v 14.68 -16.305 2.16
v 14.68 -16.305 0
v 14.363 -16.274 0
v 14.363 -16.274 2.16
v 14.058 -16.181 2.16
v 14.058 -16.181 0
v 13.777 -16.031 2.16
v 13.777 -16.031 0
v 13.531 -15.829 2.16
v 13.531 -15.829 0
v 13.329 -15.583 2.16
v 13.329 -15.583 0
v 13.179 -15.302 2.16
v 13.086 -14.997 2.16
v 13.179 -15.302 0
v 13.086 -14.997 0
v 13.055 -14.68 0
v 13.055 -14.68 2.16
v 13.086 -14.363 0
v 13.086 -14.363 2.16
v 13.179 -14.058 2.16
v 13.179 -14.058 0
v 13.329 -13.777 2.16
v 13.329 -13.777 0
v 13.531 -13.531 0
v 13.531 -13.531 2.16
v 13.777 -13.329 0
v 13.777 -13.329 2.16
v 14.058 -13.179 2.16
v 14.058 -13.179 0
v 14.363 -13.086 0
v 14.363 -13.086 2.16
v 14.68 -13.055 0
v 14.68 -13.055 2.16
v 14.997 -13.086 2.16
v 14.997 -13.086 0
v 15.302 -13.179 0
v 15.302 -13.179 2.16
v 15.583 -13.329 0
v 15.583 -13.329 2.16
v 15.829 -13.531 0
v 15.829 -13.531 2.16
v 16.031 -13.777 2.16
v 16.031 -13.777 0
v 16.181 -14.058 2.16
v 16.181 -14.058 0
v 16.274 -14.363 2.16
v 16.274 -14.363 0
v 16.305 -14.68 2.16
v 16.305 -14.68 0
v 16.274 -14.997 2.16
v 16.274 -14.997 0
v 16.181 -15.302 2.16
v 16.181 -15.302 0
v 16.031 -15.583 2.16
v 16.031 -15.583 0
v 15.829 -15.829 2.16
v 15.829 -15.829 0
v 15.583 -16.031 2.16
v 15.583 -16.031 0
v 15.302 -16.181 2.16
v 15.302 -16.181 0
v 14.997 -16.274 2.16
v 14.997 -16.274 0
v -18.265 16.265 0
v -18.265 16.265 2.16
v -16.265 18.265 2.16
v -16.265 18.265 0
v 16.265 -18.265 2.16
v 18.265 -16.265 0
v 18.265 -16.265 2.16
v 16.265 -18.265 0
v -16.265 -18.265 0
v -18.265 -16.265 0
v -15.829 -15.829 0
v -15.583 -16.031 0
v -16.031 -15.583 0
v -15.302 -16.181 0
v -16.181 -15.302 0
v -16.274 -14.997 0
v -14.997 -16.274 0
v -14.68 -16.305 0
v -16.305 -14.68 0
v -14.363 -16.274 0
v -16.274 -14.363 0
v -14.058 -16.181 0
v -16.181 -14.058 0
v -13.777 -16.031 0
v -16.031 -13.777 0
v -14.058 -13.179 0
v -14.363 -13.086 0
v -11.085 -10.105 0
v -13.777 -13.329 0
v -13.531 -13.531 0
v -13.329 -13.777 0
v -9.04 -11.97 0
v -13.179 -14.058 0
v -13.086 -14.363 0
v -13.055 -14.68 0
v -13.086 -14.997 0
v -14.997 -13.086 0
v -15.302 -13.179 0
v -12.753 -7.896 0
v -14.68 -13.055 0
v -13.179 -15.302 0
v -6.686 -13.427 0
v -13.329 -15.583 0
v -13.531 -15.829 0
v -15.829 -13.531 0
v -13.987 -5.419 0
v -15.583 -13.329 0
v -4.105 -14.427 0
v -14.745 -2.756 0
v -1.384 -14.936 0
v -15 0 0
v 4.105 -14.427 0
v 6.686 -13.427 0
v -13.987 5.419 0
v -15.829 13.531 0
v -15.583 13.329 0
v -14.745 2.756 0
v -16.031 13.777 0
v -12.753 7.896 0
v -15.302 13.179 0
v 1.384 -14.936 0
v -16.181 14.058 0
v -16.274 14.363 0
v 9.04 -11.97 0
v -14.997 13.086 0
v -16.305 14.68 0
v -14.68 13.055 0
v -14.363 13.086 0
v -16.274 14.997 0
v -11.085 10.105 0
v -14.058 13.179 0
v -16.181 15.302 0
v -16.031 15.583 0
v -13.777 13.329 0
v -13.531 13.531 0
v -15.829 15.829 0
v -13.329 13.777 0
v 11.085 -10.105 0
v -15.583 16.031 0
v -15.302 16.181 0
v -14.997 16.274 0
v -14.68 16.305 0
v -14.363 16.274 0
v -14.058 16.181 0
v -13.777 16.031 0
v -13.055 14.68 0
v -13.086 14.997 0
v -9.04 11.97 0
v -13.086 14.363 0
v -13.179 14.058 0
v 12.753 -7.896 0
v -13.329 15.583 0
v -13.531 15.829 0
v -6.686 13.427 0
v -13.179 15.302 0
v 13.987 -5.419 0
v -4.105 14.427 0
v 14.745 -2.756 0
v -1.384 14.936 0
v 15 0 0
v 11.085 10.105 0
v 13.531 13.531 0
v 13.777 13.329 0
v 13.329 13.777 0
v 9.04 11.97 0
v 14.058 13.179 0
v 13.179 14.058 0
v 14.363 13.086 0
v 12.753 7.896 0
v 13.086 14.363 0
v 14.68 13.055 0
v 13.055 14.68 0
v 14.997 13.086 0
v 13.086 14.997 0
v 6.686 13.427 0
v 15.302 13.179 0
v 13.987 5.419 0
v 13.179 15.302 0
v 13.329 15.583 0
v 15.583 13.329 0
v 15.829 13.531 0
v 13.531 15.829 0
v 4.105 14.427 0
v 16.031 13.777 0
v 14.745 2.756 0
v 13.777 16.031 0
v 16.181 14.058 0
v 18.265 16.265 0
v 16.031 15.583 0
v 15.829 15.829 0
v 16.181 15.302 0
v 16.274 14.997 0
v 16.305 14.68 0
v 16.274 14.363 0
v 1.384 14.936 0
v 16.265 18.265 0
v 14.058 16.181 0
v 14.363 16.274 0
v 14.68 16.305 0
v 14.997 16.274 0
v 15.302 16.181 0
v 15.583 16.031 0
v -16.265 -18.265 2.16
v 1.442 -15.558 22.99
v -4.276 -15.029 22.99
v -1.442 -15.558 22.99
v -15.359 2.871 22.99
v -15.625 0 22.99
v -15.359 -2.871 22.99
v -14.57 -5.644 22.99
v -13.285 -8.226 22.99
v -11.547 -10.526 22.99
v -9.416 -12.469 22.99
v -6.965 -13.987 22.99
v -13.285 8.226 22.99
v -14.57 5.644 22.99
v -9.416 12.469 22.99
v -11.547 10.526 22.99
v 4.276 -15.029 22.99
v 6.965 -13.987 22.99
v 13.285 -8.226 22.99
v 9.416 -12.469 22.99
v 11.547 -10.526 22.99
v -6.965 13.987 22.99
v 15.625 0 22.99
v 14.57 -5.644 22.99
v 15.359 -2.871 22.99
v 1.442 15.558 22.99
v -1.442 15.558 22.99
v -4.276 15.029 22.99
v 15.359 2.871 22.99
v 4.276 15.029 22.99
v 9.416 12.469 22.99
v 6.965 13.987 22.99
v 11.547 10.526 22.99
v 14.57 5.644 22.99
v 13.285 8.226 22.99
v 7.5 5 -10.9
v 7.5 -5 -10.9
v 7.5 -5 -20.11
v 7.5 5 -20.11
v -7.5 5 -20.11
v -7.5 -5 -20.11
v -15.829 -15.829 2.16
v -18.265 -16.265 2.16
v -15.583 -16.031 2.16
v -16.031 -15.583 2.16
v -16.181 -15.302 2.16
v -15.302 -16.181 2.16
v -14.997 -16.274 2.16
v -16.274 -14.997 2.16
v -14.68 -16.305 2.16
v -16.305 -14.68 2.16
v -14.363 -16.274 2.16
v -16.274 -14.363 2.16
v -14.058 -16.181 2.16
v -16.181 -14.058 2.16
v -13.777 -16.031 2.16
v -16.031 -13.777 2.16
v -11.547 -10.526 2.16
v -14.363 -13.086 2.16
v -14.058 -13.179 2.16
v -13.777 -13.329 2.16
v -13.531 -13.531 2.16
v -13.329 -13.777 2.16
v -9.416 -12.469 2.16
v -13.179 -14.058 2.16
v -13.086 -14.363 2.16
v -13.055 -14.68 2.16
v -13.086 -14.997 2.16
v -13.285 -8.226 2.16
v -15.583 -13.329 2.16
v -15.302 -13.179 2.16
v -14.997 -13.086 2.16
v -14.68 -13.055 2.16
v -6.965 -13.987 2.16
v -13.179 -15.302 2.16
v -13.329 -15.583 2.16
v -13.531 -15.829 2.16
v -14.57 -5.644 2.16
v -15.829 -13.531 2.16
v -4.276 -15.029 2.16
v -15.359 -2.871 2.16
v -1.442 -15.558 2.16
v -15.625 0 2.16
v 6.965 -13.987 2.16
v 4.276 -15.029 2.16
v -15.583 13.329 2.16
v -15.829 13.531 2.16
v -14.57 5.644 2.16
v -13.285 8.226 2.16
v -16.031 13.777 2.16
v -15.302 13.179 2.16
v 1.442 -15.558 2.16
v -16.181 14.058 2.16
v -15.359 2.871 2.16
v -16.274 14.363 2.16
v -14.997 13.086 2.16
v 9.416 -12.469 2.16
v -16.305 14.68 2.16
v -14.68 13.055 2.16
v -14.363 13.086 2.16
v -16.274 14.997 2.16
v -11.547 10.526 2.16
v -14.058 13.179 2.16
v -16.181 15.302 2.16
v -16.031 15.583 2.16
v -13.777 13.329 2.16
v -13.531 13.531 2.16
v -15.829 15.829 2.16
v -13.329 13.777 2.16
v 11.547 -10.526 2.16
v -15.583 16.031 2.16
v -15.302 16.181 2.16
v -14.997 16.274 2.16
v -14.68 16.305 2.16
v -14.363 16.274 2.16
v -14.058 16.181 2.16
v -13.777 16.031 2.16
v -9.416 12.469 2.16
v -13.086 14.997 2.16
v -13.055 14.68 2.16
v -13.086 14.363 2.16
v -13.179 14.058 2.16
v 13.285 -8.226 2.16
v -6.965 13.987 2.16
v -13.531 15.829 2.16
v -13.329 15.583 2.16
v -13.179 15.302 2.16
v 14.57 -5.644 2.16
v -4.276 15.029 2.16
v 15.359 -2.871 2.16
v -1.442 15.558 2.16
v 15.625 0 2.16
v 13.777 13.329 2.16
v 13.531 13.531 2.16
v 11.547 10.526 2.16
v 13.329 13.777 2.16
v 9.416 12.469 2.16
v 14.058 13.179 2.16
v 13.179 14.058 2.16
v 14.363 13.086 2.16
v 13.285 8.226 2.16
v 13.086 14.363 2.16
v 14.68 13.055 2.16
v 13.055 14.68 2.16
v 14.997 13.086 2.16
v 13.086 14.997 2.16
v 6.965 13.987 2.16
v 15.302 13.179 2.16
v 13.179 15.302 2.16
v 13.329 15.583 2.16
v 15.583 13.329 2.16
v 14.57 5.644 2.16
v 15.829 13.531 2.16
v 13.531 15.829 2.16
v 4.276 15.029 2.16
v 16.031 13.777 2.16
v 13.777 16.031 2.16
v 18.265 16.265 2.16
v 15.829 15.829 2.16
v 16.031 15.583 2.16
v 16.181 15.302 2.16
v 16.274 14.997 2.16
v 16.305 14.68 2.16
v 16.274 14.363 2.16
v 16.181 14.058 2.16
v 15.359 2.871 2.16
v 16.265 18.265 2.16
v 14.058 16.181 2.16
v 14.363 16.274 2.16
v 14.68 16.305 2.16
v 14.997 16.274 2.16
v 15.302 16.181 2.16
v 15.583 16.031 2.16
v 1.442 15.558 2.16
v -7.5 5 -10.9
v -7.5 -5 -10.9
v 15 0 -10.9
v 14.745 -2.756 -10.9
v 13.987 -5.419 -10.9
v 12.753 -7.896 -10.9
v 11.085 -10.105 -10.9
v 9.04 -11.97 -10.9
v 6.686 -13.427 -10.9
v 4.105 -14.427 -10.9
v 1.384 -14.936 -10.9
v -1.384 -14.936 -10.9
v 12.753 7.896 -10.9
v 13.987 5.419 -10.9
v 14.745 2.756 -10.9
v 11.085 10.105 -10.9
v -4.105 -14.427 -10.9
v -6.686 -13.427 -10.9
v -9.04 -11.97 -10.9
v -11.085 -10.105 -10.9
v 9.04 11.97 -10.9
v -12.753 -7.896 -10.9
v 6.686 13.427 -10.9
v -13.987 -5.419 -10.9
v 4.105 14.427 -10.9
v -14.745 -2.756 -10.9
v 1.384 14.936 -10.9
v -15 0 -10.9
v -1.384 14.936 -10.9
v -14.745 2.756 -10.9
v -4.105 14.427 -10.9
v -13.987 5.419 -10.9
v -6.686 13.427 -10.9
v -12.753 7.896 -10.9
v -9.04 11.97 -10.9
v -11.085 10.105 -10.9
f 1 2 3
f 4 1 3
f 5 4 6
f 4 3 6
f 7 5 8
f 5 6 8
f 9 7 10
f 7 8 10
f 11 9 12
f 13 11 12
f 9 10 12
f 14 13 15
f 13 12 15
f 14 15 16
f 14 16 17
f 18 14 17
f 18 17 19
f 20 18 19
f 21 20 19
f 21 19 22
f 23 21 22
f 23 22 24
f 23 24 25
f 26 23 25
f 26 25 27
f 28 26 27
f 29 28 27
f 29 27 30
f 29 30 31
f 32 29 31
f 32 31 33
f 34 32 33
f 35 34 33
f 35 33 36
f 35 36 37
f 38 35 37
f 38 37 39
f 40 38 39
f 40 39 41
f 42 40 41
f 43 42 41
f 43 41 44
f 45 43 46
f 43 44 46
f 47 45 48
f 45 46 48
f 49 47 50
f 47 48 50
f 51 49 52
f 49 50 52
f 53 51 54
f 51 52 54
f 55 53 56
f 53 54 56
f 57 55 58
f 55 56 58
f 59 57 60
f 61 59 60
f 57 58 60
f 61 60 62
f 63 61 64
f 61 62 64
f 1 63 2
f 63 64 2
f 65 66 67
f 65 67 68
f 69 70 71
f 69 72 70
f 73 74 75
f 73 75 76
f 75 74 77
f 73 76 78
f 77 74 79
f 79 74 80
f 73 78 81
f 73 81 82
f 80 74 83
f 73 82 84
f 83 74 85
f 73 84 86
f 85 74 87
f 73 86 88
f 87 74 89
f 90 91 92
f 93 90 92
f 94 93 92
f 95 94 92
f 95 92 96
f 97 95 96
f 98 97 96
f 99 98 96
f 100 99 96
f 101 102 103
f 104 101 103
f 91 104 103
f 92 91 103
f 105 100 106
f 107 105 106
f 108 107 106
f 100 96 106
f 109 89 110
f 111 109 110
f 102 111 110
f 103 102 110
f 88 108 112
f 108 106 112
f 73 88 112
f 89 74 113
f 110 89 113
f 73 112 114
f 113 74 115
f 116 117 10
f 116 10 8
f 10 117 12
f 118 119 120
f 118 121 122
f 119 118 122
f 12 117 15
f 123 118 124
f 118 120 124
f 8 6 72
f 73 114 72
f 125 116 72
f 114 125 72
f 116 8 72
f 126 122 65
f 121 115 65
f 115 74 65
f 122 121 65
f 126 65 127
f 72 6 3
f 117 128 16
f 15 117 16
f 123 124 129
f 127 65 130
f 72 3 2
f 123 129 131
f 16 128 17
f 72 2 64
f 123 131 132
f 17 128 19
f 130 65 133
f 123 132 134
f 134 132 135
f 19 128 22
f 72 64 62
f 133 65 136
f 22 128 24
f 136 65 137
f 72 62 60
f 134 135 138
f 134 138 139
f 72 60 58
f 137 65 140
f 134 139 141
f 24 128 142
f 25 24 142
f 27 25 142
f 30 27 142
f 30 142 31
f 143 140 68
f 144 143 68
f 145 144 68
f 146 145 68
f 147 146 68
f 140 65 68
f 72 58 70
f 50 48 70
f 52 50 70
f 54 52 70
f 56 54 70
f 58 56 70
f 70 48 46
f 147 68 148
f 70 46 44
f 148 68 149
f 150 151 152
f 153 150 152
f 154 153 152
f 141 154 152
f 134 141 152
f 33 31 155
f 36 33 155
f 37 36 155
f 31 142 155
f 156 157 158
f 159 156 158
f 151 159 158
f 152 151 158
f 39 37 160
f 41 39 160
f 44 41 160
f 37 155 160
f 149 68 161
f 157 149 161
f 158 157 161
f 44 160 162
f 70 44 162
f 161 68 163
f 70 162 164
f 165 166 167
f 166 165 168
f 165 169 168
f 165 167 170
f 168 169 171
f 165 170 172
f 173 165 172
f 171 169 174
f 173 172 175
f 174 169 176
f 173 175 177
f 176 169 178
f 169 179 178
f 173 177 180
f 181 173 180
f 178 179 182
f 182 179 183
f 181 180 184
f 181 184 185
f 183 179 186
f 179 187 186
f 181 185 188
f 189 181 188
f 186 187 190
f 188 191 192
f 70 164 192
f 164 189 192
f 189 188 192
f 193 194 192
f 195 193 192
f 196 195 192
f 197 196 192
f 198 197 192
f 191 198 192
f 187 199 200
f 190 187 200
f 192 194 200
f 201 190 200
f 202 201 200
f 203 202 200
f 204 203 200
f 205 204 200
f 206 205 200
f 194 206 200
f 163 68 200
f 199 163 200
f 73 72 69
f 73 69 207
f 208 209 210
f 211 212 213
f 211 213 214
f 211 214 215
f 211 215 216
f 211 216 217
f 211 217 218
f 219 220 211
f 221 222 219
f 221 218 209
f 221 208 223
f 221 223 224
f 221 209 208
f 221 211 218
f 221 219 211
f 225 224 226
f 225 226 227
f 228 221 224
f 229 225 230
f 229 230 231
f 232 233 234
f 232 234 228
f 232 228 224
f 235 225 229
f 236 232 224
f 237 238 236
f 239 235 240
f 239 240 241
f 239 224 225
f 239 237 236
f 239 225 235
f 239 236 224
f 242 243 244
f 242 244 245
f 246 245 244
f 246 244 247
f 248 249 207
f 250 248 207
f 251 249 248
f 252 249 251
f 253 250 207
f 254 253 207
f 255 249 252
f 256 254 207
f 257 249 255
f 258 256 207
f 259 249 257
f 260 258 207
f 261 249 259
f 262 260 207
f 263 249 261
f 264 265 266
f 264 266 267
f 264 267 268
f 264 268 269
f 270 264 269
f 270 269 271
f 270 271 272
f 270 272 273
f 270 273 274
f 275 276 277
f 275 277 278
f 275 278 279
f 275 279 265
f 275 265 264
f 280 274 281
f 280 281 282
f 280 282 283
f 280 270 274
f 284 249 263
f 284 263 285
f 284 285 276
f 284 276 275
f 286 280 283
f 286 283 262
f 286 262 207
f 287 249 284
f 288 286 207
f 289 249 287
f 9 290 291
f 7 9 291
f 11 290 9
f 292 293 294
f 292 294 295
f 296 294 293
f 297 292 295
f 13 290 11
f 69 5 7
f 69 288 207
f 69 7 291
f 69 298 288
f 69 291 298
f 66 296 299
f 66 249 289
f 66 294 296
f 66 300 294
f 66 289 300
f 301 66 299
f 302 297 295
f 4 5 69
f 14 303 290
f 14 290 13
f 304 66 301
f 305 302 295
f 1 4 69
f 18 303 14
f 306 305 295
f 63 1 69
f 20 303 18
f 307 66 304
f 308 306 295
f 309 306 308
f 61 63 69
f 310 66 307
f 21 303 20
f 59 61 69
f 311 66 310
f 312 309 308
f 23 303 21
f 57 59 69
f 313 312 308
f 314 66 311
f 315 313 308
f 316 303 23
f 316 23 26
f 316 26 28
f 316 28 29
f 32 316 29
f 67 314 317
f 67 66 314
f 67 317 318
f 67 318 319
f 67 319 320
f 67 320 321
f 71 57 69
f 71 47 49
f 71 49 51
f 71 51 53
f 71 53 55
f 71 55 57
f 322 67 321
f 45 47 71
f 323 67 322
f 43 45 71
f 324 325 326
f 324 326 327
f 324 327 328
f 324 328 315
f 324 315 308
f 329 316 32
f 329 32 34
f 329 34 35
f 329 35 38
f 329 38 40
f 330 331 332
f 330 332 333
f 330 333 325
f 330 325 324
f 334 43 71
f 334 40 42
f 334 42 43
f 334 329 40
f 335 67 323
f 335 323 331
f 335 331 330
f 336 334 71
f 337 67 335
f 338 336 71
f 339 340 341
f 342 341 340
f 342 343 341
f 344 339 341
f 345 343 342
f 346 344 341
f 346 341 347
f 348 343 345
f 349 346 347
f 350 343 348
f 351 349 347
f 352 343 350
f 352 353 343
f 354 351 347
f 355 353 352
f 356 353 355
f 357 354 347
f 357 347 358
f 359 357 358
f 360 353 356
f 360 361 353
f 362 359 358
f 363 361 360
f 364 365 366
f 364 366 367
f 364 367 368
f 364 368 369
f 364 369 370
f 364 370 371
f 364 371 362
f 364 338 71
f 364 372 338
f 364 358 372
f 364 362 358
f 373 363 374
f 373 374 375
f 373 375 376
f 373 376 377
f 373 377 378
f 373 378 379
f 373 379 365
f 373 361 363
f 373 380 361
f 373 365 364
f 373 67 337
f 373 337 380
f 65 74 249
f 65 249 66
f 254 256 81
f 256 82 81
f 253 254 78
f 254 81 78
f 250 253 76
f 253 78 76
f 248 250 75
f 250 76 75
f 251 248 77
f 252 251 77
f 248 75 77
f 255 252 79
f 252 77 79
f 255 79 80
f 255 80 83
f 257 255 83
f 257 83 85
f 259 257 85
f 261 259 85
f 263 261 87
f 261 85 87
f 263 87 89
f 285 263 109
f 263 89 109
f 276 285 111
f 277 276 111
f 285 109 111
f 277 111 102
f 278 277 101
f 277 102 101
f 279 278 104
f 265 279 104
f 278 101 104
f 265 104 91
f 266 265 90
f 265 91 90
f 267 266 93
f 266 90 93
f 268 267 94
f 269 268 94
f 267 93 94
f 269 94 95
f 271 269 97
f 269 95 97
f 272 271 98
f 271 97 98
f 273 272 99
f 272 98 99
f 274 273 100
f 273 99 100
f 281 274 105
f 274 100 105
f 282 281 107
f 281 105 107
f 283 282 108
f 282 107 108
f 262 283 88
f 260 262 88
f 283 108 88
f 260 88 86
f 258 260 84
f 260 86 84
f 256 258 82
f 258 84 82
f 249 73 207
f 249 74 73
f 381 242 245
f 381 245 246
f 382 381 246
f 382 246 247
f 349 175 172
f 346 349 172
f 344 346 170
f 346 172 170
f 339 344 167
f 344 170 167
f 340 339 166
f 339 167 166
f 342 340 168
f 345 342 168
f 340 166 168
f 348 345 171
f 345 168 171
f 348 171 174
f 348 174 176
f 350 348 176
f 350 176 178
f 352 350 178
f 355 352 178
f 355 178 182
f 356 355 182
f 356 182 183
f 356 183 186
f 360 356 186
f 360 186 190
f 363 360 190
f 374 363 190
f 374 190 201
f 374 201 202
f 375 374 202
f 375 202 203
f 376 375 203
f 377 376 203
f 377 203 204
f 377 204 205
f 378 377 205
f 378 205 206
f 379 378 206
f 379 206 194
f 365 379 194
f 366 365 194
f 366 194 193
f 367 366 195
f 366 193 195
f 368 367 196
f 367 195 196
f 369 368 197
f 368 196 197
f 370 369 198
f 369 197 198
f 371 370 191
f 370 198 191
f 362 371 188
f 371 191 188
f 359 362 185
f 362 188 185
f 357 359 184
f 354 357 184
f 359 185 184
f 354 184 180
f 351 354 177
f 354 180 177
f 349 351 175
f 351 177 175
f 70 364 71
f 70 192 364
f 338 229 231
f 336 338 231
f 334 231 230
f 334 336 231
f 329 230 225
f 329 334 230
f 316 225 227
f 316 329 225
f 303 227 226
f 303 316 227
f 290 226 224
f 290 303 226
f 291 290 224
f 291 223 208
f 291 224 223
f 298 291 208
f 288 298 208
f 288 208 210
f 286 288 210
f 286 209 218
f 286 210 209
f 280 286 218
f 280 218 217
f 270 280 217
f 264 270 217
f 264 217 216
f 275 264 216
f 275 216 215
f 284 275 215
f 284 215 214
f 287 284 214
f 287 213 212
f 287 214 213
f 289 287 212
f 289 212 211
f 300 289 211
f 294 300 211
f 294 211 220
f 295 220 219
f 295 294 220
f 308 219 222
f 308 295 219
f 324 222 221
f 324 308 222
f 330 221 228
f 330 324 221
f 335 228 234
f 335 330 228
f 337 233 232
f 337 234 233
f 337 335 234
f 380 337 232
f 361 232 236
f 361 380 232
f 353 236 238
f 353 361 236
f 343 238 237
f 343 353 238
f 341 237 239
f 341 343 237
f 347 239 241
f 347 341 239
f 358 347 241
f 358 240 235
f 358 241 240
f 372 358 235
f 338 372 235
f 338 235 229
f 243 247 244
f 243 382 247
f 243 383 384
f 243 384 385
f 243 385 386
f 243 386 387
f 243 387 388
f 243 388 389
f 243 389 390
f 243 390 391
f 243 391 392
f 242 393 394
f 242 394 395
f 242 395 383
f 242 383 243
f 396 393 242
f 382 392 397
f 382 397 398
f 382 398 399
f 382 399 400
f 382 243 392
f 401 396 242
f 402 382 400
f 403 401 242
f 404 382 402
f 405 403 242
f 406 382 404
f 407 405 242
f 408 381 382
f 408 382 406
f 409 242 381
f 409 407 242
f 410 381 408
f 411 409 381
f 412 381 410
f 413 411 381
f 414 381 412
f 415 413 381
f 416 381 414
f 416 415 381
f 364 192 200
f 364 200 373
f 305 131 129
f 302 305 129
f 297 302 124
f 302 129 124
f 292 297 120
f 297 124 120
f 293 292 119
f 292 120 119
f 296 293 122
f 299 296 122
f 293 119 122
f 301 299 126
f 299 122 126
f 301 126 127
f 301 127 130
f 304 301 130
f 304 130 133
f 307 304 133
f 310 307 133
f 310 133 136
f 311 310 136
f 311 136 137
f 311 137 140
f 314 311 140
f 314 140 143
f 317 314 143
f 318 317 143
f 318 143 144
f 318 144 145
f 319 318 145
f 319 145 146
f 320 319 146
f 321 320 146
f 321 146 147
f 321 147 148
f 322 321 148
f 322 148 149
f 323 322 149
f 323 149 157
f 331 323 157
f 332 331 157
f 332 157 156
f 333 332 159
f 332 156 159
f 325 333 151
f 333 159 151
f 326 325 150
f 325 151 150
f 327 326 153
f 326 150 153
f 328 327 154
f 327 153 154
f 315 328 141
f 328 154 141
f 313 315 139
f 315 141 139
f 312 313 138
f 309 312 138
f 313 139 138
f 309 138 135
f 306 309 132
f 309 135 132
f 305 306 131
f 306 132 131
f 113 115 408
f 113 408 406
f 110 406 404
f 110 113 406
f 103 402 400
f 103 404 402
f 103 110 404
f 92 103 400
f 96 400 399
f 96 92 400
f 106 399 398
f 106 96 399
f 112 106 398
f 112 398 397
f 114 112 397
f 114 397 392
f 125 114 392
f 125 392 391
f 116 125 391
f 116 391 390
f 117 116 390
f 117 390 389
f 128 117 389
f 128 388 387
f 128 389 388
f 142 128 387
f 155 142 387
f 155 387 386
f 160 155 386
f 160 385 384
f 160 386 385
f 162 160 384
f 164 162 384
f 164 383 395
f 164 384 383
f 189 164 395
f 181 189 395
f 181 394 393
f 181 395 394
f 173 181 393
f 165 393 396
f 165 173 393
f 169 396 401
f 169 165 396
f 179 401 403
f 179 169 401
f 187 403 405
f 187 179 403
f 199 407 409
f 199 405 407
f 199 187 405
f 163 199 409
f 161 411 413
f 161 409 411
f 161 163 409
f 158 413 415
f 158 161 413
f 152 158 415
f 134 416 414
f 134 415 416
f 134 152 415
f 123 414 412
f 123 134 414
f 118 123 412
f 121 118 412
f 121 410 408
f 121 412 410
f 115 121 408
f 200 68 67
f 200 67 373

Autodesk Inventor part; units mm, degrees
ref_plane "YZ Plane" through (0, 0, 0) normal (1, 0, 0) x (0, 1, 0)
ref_plane "XZ Plane" through (0, 0, 0) normal (0, 1, 0) x (-1, 0, 0)
ref_plane "XY Plane" through (0, 0, 0) normal (0, 0, 1) x (1, 0, 0)
sketch "Sketch1" plane through (0, 0, 0) normal (0, 0, 1) x (1, 0, 0)
  line L0 (-18.265, 18.265) -> (18.265, 18.265)
  line L1 (18.265, 18.265) -> (18.265, -18.265)
  line L2 (18.265, -18.265) -> (-18.265, -18.265)
  line L3 (-18.265, -18.265) -> (-18.265, 18.265)
  point P0 (0, 0)
  point P1 (0, 18.265)
  point P2 (-18.265, 0)
  dimension "d0" = 36.53
  dimension "d1" = 36.53
extrude "Extrusion1" add sketch "Sketch1" along normal blind 2.16
chamfer "Chamfer1" distance 2 angle 45 4 edges at (18.265, 18.265, 1.08) (-18.265, 18.265, 1.08) (-18.265, -18.265, 1.08) (18.265, -18.265, 1.08)
sketch "Sketch2" plane through (0, 0, 2.16) normal (0, 0, 1) x (1, 0, 0)
  line L0 (-14.68, 14.68) -> (14.68, 14.68)
  line L1 (14.68, 14.68) -> (14.68, -14.68)
  line L2 (14.68, -14.68) -> (-14.68, -14.68)
  line L3 (-14.68, -14.68) -> (-14.68, 14.68)
  point P0 (0, 0)
  point P1 (0, 14.68)
  point P2 (-14.68, 0)
  dimension "d7" = 29.36
hole "Hole1" at (-14.68, 14.68, 2.16) at (14.68, 14.68, 2.16) at (-14.68, -14.68, 2.16) at (14.68, -14.68, 2.16) direction (0, 0, -1) diameter 3.25 end through all
sketch "Sketch3" plane through (0, 0, 2.16) normal (0, 0, 1) x (1, 0, 0)
  circle A0 centre (0, 0) radius 15.625
  dimension "d15" = 31.25
extrude "Extrusion2" add sketch "Sketch3" along normal blind 20.83
sketch "Sketch4" plane through (0, 0, 0) normal (0, 0, -1) x (-1, 0, 0)
  circle A0 centre (0, 0) radius 15
  dimension "d18" = 30
extrude "Extrusion3" add sketch "Sketch4" along normal blind 10.9
sketch "Sketch5" plane through (0, 0, -10.9) normal (0, 0, -1) x (-1, 0, 0)
  line L0 (-7.5, 5) -> (7.5, 5)
  line L1 (7.5, 5) -> (7.5, -5)
  line L2 (7.5, -5) -> (-7.5, -5)
  line L3 (-7.5, -5) -> (-7.5, 5)
  point P0 (0, 0)
  point P1 (0, 5)
  point P2 (7.5, 0)
  dimension "d21" = 15
  dimension "d22" = 10
extrude "Extrusion4" add sketch "Sketch5" along normal blind 9.21
properties part number "RJFTV21 X Amphenol Connector"
